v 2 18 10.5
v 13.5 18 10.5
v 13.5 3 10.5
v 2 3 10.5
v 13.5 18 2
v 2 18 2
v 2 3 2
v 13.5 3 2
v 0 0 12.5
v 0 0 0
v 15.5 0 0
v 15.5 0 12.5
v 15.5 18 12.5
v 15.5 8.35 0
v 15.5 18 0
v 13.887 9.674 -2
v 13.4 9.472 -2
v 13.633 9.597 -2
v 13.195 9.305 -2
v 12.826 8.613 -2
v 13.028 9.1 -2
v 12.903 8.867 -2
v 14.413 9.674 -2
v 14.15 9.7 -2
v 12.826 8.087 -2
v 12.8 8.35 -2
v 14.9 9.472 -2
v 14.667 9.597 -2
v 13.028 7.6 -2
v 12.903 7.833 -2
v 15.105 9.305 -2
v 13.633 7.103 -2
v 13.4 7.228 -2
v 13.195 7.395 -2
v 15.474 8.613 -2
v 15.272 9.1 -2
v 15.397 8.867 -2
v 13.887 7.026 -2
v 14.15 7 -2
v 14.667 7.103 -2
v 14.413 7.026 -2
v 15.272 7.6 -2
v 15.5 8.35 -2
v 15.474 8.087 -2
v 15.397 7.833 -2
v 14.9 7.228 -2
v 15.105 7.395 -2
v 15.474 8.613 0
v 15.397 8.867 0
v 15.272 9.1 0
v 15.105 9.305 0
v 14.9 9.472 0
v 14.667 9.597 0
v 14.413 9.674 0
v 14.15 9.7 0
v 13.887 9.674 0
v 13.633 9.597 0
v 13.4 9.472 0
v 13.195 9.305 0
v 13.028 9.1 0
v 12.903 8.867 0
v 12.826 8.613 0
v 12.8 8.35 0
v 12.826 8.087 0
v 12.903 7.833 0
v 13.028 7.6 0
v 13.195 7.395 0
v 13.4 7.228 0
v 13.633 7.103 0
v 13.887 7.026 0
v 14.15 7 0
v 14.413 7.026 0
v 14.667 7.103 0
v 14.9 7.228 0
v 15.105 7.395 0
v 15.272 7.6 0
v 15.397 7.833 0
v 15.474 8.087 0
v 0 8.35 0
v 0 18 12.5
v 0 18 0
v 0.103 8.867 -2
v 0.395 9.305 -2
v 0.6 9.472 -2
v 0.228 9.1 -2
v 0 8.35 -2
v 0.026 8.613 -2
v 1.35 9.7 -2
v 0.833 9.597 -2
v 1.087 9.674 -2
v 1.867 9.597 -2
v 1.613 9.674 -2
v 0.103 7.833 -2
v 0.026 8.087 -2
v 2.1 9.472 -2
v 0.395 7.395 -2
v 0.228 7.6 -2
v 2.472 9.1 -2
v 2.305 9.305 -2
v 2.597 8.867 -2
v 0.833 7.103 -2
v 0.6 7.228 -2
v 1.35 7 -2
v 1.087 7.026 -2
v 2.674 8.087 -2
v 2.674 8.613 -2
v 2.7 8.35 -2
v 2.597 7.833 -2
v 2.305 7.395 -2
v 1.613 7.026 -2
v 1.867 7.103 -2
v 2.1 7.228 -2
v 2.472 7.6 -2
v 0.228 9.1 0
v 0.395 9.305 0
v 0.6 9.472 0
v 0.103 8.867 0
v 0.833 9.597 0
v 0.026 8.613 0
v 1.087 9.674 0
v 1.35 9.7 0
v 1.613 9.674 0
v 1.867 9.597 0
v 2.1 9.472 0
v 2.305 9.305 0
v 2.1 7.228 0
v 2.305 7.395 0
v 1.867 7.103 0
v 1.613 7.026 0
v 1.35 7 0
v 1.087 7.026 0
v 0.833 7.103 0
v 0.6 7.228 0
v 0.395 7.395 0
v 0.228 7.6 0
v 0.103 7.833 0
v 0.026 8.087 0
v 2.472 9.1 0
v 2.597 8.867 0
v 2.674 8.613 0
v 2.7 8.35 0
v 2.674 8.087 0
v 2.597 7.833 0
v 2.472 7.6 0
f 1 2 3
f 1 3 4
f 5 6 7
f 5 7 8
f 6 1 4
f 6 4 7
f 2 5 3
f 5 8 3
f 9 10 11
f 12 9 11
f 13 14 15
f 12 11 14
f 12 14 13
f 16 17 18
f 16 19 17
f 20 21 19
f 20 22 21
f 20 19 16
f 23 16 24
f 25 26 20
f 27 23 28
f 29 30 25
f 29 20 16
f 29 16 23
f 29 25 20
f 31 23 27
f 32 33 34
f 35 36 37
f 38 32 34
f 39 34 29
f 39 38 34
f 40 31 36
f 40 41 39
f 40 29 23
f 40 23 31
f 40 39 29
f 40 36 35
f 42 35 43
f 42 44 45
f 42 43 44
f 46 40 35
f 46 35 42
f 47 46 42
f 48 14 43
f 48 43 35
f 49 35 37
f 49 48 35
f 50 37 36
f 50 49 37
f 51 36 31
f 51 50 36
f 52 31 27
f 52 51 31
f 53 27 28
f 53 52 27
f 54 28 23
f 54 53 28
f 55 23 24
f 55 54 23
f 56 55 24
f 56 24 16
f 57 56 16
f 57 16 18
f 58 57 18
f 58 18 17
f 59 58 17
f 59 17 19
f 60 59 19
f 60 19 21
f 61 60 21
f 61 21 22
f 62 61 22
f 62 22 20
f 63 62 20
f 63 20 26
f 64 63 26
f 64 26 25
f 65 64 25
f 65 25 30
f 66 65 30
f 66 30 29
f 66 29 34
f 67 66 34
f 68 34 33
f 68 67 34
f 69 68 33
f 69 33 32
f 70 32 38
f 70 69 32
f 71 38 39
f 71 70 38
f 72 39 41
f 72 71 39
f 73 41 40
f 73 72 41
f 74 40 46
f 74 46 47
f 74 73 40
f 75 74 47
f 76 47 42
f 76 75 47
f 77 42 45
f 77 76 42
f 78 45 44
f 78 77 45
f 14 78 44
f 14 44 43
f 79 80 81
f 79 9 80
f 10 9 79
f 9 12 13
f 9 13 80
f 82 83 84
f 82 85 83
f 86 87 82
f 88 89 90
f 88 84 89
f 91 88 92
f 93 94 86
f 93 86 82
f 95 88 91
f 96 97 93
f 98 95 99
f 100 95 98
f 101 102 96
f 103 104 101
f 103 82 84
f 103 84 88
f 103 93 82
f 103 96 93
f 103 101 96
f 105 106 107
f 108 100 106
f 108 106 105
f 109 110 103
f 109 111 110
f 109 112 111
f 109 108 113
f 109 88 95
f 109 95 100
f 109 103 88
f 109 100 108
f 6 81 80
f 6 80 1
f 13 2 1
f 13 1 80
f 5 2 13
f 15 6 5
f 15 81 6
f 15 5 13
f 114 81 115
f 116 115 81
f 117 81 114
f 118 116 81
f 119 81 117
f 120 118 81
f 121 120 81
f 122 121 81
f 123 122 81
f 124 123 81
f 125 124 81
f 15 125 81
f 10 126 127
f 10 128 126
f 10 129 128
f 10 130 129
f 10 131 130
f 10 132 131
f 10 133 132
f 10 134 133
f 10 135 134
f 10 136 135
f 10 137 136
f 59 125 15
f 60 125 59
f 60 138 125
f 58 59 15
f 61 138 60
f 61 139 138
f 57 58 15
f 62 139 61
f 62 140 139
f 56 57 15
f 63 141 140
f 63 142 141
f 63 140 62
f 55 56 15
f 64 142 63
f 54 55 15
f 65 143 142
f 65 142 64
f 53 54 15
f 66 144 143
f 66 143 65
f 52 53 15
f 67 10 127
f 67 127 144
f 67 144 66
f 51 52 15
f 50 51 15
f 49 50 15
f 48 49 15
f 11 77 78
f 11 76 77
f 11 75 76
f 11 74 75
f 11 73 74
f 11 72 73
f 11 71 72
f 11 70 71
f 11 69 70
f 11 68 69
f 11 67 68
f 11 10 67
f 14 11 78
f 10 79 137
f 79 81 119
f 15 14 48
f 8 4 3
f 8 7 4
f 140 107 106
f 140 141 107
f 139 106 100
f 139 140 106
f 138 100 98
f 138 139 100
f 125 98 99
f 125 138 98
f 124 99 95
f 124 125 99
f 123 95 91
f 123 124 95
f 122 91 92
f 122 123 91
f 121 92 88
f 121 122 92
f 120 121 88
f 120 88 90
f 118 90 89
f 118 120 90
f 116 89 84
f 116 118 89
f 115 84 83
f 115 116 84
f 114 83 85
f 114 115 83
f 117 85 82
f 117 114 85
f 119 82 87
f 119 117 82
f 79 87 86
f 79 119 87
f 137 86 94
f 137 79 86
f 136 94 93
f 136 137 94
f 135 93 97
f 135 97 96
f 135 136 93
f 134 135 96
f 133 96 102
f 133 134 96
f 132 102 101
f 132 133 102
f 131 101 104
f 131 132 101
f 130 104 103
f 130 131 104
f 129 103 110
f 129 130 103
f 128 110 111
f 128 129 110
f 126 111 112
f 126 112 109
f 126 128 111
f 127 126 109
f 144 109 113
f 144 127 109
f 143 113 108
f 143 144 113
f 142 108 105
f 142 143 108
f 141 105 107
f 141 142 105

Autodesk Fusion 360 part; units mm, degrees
sketch "Sketch1" plane through (0, 0, 0) normal (0, 1, 0) x (1, 0, 0)
  line L0 (0, 0) -> (15.5, 0)
  line L1 (15.5, 0) -> (15.5, -12.5)
  line L2 (15.5, -12.5) -> (0, -12.5)
  line L3 (0, -12.5) -> (0, 0)
  line L4 (2, -2) -> (13.5, -2)
  line L5 (13.5, -2) -> (13.5, -10.5)
  line L6 (13.5, -10.5) -> (2, -10.5)
  line L7 (2, -10.5) -> (2, -2)
  dimension "d1" = 15.5
  dimension "d2" = 12.5
  dimension "d3" = 2
extrude "Extrude1" add sketch "Sketch1" along normal blind 18
extrude "Extrude2" add sketch "Sketch1" along normal blind 3 contours L4 L5 L6 L7
sketch "Sketch2" plane through (0, 0, 0) normal (0, 0, -1) x (1, 0, 0)
  line L0 (15.5, 0) -> (0, 0)
  line L1 (0, 0) -> (0, -18)
  line L2 (0, -18) -> (15.5, -18)
  line L3 (15.5, -18) -> (15.5, 0)
  line L4 (0, -18) -> (0, -7)
  line L5 (0, -7) -> (15.5, -7)
  line L6 (15.5, -7) -> (15.5, -18)
  circle A0 centre (14.15, -8.35) radius 1.35
  circle A1 centre (1.35, -8.35) radius 1.35
  dimension "d8" = 11
  dimension "d9" = 1.35
  dimension "d10" = 1.35
extrude "Extrude3" add sketch "Sketch2" along normal blind 2 contours A0 | A1
equation "d9 = ( 2.7 / 2 ) * 1 mm"
equation "d10 = ( 2.7 / 2 ) * 1 mm"
